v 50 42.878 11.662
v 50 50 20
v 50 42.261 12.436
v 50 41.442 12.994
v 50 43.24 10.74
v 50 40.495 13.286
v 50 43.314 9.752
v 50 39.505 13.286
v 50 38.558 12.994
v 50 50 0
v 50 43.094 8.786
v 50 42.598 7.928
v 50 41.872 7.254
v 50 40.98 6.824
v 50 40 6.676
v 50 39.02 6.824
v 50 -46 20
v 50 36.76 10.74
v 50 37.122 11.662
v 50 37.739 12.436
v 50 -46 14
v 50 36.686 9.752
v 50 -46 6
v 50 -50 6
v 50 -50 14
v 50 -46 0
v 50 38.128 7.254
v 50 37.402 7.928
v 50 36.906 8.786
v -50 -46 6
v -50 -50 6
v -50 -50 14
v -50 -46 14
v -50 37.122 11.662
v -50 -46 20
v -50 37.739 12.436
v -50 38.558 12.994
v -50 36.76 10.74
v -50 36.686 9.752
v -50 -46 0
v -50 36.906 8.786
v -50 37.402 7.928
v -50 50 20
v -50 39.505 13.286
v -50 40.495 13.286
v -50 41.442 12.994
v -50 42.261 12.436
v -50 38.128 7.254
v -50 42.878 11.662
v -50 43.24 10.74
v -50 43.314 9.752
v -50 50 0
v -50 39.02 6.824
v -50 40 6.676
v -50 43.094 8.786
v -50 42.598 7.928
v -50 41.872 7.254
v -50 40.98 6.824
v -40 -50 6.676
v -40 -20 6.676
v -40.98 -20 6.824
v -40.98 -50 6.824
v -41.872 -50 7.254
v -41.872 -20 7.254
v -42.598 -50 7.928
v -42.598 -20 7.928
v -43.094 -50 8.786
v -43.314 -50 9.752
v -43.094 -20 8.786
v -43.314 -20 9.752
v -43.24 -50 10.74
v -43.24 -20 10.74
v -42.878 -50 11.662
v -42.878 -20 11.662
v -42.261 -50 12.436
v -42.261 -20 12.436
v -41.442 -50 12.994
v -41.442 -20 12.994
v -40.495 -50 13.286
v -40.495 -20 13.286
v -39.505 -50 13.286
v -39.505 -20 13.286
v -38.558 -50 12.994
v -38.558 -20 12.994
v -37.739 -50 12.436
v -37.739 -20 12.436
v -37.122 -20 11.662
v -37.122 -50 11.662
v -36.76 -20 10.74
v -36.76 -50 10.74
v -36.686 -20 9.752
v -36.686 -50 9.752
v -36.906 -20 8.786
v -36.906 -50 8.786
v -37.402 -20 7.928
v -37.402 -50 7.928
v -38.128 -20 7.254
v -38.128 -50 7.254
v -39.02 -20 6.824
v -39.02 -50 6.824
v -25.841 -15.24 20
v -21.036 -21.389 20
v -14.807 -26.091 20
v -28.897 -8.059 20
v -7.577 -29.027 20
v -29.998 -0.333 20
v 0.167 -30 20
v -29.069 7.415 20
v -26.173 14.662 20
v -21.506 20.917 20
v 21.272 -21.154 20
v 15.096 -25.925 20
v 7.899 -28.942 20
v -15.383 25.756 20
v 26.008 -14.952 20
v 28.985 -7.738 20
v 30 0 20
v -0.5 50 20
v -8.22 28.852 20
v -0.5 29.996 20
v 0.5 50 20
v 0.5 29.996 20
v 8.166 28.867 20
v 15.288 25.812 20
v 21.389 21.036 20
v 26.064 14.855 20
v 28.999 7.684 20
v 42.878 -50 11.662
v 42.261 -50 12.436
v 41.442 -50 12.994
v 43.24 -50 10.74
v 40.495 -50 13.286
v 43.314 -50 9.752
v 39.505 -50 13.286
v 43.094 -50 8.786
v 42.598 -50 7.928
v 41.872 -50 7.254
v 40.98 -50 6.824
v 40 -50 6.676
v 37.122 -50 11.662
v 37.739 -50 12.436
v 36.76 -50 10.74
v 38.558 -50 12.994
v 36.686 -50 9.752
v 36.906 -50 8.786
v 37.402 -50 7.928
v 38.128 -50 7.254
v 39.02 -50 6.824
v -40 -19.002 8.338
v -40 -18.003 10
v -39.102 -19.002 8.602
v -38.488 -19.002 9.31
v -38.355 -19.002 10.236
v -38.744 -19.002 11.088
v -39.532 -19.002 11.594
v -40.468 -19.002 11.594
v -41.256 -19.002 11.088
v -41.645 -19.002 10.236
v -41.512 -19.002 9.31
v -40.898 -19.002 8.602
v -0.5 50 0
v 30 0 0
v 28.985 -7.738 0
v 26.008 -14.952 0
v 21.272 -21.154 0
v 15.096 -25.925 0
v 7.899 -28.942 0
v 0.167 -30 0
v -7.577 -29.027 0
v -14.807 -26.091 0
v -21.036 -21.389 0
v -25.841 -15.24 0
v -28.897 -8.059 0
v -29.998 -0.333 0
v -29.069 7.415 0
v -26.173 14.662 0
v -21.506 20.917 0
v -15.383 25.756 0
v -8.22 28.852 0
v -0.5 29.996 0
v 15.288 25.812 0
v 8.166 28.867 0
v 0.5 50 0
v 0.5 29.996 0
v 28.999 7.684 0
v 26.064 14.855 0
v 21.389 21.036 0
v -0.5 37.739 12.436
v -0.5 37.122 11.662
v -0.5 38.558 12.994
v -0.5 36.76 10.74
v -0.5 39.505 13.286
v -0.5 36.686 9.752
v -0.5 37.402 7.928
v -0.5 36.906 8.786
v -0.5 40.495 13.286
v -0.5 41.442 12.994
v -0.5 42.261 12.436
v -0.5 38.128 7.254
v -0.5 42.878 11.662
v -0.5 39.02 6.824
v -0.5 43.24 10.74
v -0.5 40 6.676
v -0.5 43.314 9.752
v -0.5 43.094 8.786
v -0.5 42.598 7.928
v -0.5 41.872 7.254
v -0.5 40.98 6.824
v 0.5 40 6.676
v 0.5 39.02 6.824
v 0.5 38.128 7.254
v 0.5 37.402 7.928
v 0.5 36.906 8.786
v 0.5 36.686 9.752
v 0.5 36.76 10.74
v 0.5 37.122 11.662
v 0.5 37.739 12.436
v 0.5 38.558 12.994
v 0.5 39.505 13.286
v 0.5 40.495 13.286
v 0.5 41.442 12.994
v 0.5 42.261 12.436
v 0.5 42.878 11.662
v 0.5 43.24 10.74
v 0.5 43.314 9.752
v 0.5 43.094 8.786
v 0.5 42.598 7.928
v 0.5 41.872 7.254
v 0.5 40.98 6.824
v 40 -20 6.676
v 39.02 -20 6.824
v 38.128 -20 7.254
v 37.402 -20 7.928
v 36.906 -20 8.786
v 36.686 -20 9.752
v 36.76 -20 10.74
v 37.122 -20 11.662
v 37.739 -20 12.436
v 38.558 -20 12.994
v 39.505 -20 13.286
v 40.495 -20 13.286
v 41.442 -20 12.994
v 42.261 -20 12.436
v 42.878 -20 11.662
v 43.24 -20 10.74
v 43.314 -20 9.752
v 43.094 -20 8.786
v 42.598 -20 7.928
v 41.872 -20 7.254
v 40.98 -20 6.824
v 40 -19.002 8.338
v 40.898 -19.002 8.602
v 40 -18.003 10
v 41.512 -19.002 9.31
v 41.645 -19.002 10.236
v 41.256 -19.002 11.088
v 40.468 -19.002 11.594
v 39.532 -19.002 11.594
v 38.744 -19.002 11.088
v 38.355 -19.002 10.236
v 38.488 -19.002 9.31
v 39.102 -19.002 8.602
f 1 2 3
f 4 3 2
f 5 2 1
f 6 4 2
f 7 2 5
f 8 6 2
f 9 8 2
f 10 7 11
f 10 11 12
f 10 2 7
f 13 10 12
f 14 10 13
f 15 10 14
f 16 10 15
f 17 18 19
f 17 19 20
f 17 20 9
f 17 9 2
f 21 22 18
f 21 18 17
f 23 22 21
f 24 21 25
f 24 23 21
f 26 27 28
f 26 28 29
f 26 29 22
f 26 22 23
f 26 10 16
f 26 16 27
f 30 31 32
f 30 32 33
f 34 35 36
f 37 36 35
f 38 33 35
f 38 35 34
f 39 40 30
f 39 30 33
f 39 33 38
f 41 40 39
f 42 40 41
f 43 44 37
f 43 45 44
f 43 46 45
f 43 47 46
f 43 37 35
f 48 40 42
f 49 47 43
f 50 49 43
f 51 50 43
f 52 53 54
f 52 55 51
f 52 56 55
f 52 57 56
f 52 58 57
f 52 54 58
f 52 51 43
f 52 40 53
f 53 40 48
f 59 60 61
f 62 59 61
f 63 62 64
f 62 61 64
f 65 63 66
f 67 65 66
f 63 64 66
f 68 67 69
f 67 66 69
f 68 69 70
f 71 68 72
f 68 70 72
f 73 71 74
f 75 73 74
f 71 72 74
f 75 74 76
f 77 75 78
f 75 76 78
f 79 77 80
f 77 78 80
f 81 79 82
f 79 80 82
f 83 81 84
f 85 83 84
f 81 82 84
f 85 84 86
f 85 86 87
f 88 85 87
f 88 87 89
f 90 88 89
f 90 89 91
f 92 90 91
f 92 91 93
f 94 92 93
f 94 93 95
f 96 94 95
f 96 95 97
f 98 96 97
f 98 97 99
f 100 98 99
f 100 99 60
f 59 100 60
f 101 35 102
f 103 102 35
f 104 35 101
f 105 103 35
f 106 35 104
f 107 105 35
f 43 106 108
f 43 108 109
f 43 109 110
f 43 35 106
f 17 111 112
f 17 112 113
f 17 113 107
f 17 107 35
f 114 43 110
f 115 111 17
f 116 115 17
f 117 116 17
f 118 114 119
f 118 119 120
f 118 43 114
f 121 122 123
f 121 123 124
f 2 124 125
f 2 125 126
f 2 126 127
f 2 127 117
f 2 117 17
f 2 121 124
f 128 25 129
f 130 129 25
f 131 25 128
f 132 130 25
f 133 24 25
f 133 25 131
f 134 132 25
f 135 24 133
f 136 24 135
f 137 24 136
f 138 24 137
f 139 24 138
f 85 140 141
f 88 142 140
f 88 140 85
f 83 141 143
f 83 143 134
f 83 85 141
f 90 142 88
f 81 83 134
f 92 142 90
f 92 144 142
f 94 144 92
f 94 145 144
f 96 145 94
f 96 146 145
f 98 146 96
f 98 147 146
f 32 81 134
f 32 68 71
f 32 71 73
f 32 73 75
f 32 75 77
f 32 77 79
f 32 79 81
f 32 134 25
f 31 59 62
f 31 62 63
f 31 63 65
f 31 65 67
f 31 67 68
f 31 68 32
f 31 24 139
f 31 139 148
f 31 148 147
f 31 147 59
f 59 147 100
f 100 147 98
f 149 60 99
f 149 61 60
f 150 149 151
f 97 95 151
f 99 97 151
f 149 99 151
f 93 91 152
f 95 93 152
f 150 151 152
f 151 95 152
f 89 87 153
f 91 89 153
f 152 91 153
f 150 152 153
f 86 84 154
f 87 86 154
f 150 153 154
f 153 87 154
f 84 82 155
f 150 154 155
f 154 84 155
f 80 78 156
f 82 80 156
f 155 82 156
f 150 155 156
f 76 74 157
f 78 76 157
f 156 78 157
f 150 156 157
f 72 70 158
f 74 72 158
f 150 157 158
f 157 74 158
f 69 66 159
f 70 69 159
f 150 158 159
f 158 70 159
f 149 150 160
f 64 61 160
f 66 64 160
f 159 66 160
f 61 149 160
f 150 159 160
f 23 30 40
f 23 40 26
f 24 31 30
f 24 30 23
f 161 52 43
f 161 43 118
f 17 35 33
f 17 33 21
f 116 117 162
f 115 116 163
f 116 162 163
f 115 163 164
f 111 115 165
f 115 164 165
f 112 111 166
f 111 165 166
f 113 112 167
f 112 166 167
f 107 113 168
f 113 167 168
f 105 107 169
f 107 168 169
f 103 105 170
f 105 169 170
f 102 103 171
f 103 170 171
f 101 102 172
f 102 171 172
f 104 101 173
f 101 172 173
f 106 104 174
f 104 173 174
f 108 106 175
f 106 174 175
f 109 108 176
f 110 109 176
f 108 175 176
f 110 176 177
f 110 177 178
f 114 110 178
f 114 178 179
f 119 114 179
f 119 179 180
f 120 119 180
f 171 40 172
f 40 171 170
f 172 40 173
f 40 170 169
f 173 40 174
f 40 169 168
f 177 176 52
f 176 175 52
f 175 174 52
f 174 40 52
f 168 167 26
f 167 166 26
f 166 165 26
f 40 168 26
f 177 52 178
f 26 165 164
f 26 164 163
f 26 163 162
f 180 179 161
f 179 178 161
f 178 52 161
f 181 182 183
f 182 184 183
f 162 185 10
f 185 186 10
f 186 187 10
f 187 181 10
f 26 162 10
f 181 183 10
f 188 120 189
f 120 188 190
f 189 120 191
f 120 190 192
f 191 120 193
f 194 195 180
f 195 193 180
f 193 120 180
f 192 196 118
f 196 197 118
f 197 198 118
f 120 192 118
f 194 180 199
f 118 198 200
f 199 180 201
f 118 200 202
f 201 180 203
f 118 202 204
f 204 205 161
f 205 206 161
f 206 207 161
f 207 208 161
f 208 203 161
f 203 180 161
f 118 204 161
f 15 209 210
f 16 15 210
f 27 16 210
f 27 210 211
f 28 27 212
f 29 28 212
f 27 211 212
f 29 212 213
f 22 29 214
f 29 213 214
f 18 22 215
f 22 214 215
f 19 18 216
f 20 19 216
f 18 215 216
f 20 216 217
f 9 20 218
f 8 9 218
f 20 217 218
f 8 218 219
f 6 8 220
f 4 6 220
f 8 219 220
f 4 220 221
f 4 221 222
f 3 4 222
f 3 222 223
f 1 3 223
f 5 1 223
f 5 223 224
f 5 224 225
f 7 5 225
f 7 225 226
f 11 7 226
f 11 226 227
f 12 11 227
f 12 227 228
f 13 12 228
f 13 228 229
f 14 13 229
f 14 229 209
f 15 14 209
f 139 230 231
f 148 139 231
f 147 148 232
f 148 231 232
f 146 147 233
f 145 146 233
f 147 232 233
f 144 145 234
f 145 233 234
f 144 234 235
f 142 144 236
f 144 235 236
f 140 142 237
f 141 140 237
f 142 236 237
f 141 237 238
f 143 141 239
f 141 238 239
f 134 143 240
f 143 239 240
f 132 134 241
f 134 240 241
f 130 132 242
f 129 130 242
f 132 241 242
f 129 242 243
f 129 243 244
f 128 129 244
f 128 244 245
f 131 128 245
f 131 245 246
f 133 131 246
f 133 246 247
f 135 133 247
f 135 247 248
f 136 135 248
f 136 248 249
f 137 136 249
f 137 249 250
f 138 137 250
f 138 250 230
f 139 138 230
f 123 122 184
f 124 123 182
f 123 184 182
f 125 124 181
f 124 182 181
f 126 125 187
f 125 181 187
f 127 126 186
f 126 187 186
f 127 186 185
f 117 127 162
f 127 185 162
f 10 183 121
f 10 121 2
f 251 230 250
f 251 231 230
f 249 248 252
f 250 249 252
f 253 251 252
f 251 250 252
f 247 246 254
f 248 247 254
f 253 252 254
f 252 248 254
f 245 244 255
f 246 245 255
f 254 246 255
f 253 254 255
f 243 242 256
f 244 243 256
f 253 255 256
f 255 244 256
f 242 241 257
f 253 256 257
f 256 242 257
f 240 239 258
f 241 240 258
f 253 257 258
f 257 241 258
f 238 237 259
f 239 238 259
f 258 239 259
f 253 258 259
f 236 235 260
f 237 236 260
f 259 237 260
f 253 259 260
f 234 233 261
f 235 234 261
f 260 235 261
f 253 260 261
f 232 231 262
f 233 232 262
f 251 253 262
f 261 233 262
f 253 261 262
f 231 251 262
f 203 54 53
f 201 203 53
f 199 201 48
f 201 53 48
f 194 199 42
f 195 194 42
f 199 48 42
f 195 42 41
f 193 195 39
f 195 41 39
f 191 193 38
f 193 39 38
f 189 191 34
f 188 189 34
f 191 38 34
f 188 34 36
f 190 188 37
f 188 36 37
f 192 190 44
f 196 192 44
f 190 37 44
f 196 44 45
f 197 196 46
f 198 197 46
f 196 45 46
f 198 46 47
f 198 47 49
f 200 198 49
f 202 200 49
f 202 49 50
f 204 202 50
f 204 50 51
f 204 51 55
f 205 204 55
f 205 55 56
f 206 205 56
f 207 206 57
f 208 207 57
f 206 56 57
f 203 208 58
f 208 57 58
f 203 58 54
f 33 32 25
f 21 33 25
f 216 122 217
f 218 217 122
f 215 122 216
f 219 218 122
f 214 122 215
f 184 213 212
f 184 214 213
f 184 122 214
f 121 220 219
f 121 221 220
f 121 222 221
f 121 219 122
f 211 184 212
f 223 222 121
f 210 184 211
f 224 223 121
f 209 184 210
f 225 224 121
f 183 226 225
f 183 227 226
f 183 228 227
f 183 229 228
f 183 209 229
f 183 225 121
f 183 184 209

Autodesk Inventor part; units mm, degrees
ref_plane "YZ Plane" through (0, 0, 0) normal (1, 0, 0) x (0, 1, 0)
ref_plane "XZ Plane" through (0, 0, 0) normal (0, 1, 0) x (-1, 0, 0)
ref_plane "XY Plane" through (0, 0, 0) normal (0, 0, 1) x (1, 0, 0)
sketch "Sketch1" plane through (0, 0, 0) normal (0, 0, 1) x (1, 0, 0)
  line L0 (0, 70) -> (0, -70) projected
  line L1 (-70, 0) -> (70, 0) projected
  line L2 (-50, 50) -> (50, 50)
  line L3 (50, 50) -> (50, -50)
  line L4 (50, -50) -> (-50, -50)
  line L5 (-50, -50) -> (-50, 50)
  circle A0 centre (0, 0) radius 30
  dimension "d0" = 100
  dimension "d1" = 100
  dimension "d2" = 60
extrude "Extrusion1" add sketch "Sketch1" along normal blind 20 contours L2 L3 L1 A0 L0 | L0 A0 L1 L5 L2 | L1 L3 L4 L0 A0 | A0 L0 L4 L5 L1
sketch "Sketch2" plane through (-50, -50, 0) normal (0, -1, 0) x (1, 0, 0)
  line L0 (20, 20) -> (20, 0) projected
  line L1 (0, 0) -> (100, 0) projected
  line L2 (100, 0) -> (100, 20) projected
  line L3 (0, 20) -> (100, 20) projected
  line L4 (0, 0) -> (0, 20) projected
  line L5 (80, 20) -> (80, 0) projected
  line L6 (0, 0) -> (0, 20) projected
  line L7 (0, 10) -> (100, 10)
  line L8 (0, 14) -> (100, 14)
  line L9 (0, 6) -> (100, 6)
  point P0 (50, 0)
  dimension "d5" = 4
  dimension "d6" = 4
extrude "Extrusion2" cut sketch "Sketch2" against normal blind 4 contours L3 L5 L8 L0 | L0 L8 L4 L3 | L3 L2 L8 L5 | L9 L5 L1 L0 | L0 L1 L4 L9 | L9 L2 L1 L5
sketch "Sketch3" plane through (0, 0, 0) normal (0, 0, -1) x (-1, 0, 0)
  line L0 (0, -70) -> (0, 70) projected
  line L1 (0.5, -70) -> (0.5, 70)
  line L2 (-0.5, -70) -> (-0.5, 70)
  line L3 (-50, -46) -> (50, -46) projected
  line L4 (50, 50) -> (50, -46) projected
  line L5 (-50, 50) -> (50, 50) projected
  line L6 (-50, -46) -> (-50, 50) projected
  circle A0 centre (0, 0) radius 30 projected
  point P0 (0.5, 29.9958)
  point P1 (0.5, 50)
  point P2 (-0.5, 50)
  point P3 (-0.5, 29.9958)
  dimension "d9" = 0.5
  dimension "d10" = 0.5
extrude "Extrusion3" cut sketch "Sketch3" against normal through all contours A0 L2 L5 L0 | L0 L5 L1 A0
sketch "Sketch4" plane through (50, 50, 20) normal (1, 0, 0) x (0, 0, -1)
  line L0 (20, 0) -> (0, 0) projected
  line L1 (20, -96) -> (20, 0) projected
  point P0 (20, -50)
  point P1 (10, -10)
  dimension "d13" = 10
  dimension "d14" = 10
hole "Hole1" at (50, 40, 10) direction (-1, 0, 0) diameter 6.647 depth 110 tip angle 118 thread size "M8x1.25" class "6H" standard "ISO Metric profile"
sketch "Sketch5" plane through (-50, -50, 14) normal (0, -1, 0) x (1, 0, 0)
  line L0 (100, -14) -> (0, -14) projected
  line L1 (100, -8) -> (100, 0) projected
  point P0 (50, -14)
  point P1 (90, -4)
  dimension "d22" = 10
  dimension "d23" = 10
hole "Hole2" at (40, -50, 10) direction (0, 1, 0) diameter 6.647 depth 30 tip angle 118 thread size "M8x1.25" class "6H" standard "ISO Metric profile"
sketch "Sketch6" plane through (-50, -50, 14) normal (0, -1, 0) x (1, 0, 0)
  line L0 (0, -8) -> (0, 0) projected
  line L1 (100, -14) -> (0, -14) projected
  point P0 (50, -14)
  point P1 (10, -4)
  dimension "d31" = 10
  dimension "d32" = 10
hole "Hole3" at (-40, -50, 10) direction (0, 1, 0) diameter 6.647 depth 30 tip angle 118 thread size "M8x1.25" class "6H" standard "ISO Metric profile"
properties part number "upperClamp"
